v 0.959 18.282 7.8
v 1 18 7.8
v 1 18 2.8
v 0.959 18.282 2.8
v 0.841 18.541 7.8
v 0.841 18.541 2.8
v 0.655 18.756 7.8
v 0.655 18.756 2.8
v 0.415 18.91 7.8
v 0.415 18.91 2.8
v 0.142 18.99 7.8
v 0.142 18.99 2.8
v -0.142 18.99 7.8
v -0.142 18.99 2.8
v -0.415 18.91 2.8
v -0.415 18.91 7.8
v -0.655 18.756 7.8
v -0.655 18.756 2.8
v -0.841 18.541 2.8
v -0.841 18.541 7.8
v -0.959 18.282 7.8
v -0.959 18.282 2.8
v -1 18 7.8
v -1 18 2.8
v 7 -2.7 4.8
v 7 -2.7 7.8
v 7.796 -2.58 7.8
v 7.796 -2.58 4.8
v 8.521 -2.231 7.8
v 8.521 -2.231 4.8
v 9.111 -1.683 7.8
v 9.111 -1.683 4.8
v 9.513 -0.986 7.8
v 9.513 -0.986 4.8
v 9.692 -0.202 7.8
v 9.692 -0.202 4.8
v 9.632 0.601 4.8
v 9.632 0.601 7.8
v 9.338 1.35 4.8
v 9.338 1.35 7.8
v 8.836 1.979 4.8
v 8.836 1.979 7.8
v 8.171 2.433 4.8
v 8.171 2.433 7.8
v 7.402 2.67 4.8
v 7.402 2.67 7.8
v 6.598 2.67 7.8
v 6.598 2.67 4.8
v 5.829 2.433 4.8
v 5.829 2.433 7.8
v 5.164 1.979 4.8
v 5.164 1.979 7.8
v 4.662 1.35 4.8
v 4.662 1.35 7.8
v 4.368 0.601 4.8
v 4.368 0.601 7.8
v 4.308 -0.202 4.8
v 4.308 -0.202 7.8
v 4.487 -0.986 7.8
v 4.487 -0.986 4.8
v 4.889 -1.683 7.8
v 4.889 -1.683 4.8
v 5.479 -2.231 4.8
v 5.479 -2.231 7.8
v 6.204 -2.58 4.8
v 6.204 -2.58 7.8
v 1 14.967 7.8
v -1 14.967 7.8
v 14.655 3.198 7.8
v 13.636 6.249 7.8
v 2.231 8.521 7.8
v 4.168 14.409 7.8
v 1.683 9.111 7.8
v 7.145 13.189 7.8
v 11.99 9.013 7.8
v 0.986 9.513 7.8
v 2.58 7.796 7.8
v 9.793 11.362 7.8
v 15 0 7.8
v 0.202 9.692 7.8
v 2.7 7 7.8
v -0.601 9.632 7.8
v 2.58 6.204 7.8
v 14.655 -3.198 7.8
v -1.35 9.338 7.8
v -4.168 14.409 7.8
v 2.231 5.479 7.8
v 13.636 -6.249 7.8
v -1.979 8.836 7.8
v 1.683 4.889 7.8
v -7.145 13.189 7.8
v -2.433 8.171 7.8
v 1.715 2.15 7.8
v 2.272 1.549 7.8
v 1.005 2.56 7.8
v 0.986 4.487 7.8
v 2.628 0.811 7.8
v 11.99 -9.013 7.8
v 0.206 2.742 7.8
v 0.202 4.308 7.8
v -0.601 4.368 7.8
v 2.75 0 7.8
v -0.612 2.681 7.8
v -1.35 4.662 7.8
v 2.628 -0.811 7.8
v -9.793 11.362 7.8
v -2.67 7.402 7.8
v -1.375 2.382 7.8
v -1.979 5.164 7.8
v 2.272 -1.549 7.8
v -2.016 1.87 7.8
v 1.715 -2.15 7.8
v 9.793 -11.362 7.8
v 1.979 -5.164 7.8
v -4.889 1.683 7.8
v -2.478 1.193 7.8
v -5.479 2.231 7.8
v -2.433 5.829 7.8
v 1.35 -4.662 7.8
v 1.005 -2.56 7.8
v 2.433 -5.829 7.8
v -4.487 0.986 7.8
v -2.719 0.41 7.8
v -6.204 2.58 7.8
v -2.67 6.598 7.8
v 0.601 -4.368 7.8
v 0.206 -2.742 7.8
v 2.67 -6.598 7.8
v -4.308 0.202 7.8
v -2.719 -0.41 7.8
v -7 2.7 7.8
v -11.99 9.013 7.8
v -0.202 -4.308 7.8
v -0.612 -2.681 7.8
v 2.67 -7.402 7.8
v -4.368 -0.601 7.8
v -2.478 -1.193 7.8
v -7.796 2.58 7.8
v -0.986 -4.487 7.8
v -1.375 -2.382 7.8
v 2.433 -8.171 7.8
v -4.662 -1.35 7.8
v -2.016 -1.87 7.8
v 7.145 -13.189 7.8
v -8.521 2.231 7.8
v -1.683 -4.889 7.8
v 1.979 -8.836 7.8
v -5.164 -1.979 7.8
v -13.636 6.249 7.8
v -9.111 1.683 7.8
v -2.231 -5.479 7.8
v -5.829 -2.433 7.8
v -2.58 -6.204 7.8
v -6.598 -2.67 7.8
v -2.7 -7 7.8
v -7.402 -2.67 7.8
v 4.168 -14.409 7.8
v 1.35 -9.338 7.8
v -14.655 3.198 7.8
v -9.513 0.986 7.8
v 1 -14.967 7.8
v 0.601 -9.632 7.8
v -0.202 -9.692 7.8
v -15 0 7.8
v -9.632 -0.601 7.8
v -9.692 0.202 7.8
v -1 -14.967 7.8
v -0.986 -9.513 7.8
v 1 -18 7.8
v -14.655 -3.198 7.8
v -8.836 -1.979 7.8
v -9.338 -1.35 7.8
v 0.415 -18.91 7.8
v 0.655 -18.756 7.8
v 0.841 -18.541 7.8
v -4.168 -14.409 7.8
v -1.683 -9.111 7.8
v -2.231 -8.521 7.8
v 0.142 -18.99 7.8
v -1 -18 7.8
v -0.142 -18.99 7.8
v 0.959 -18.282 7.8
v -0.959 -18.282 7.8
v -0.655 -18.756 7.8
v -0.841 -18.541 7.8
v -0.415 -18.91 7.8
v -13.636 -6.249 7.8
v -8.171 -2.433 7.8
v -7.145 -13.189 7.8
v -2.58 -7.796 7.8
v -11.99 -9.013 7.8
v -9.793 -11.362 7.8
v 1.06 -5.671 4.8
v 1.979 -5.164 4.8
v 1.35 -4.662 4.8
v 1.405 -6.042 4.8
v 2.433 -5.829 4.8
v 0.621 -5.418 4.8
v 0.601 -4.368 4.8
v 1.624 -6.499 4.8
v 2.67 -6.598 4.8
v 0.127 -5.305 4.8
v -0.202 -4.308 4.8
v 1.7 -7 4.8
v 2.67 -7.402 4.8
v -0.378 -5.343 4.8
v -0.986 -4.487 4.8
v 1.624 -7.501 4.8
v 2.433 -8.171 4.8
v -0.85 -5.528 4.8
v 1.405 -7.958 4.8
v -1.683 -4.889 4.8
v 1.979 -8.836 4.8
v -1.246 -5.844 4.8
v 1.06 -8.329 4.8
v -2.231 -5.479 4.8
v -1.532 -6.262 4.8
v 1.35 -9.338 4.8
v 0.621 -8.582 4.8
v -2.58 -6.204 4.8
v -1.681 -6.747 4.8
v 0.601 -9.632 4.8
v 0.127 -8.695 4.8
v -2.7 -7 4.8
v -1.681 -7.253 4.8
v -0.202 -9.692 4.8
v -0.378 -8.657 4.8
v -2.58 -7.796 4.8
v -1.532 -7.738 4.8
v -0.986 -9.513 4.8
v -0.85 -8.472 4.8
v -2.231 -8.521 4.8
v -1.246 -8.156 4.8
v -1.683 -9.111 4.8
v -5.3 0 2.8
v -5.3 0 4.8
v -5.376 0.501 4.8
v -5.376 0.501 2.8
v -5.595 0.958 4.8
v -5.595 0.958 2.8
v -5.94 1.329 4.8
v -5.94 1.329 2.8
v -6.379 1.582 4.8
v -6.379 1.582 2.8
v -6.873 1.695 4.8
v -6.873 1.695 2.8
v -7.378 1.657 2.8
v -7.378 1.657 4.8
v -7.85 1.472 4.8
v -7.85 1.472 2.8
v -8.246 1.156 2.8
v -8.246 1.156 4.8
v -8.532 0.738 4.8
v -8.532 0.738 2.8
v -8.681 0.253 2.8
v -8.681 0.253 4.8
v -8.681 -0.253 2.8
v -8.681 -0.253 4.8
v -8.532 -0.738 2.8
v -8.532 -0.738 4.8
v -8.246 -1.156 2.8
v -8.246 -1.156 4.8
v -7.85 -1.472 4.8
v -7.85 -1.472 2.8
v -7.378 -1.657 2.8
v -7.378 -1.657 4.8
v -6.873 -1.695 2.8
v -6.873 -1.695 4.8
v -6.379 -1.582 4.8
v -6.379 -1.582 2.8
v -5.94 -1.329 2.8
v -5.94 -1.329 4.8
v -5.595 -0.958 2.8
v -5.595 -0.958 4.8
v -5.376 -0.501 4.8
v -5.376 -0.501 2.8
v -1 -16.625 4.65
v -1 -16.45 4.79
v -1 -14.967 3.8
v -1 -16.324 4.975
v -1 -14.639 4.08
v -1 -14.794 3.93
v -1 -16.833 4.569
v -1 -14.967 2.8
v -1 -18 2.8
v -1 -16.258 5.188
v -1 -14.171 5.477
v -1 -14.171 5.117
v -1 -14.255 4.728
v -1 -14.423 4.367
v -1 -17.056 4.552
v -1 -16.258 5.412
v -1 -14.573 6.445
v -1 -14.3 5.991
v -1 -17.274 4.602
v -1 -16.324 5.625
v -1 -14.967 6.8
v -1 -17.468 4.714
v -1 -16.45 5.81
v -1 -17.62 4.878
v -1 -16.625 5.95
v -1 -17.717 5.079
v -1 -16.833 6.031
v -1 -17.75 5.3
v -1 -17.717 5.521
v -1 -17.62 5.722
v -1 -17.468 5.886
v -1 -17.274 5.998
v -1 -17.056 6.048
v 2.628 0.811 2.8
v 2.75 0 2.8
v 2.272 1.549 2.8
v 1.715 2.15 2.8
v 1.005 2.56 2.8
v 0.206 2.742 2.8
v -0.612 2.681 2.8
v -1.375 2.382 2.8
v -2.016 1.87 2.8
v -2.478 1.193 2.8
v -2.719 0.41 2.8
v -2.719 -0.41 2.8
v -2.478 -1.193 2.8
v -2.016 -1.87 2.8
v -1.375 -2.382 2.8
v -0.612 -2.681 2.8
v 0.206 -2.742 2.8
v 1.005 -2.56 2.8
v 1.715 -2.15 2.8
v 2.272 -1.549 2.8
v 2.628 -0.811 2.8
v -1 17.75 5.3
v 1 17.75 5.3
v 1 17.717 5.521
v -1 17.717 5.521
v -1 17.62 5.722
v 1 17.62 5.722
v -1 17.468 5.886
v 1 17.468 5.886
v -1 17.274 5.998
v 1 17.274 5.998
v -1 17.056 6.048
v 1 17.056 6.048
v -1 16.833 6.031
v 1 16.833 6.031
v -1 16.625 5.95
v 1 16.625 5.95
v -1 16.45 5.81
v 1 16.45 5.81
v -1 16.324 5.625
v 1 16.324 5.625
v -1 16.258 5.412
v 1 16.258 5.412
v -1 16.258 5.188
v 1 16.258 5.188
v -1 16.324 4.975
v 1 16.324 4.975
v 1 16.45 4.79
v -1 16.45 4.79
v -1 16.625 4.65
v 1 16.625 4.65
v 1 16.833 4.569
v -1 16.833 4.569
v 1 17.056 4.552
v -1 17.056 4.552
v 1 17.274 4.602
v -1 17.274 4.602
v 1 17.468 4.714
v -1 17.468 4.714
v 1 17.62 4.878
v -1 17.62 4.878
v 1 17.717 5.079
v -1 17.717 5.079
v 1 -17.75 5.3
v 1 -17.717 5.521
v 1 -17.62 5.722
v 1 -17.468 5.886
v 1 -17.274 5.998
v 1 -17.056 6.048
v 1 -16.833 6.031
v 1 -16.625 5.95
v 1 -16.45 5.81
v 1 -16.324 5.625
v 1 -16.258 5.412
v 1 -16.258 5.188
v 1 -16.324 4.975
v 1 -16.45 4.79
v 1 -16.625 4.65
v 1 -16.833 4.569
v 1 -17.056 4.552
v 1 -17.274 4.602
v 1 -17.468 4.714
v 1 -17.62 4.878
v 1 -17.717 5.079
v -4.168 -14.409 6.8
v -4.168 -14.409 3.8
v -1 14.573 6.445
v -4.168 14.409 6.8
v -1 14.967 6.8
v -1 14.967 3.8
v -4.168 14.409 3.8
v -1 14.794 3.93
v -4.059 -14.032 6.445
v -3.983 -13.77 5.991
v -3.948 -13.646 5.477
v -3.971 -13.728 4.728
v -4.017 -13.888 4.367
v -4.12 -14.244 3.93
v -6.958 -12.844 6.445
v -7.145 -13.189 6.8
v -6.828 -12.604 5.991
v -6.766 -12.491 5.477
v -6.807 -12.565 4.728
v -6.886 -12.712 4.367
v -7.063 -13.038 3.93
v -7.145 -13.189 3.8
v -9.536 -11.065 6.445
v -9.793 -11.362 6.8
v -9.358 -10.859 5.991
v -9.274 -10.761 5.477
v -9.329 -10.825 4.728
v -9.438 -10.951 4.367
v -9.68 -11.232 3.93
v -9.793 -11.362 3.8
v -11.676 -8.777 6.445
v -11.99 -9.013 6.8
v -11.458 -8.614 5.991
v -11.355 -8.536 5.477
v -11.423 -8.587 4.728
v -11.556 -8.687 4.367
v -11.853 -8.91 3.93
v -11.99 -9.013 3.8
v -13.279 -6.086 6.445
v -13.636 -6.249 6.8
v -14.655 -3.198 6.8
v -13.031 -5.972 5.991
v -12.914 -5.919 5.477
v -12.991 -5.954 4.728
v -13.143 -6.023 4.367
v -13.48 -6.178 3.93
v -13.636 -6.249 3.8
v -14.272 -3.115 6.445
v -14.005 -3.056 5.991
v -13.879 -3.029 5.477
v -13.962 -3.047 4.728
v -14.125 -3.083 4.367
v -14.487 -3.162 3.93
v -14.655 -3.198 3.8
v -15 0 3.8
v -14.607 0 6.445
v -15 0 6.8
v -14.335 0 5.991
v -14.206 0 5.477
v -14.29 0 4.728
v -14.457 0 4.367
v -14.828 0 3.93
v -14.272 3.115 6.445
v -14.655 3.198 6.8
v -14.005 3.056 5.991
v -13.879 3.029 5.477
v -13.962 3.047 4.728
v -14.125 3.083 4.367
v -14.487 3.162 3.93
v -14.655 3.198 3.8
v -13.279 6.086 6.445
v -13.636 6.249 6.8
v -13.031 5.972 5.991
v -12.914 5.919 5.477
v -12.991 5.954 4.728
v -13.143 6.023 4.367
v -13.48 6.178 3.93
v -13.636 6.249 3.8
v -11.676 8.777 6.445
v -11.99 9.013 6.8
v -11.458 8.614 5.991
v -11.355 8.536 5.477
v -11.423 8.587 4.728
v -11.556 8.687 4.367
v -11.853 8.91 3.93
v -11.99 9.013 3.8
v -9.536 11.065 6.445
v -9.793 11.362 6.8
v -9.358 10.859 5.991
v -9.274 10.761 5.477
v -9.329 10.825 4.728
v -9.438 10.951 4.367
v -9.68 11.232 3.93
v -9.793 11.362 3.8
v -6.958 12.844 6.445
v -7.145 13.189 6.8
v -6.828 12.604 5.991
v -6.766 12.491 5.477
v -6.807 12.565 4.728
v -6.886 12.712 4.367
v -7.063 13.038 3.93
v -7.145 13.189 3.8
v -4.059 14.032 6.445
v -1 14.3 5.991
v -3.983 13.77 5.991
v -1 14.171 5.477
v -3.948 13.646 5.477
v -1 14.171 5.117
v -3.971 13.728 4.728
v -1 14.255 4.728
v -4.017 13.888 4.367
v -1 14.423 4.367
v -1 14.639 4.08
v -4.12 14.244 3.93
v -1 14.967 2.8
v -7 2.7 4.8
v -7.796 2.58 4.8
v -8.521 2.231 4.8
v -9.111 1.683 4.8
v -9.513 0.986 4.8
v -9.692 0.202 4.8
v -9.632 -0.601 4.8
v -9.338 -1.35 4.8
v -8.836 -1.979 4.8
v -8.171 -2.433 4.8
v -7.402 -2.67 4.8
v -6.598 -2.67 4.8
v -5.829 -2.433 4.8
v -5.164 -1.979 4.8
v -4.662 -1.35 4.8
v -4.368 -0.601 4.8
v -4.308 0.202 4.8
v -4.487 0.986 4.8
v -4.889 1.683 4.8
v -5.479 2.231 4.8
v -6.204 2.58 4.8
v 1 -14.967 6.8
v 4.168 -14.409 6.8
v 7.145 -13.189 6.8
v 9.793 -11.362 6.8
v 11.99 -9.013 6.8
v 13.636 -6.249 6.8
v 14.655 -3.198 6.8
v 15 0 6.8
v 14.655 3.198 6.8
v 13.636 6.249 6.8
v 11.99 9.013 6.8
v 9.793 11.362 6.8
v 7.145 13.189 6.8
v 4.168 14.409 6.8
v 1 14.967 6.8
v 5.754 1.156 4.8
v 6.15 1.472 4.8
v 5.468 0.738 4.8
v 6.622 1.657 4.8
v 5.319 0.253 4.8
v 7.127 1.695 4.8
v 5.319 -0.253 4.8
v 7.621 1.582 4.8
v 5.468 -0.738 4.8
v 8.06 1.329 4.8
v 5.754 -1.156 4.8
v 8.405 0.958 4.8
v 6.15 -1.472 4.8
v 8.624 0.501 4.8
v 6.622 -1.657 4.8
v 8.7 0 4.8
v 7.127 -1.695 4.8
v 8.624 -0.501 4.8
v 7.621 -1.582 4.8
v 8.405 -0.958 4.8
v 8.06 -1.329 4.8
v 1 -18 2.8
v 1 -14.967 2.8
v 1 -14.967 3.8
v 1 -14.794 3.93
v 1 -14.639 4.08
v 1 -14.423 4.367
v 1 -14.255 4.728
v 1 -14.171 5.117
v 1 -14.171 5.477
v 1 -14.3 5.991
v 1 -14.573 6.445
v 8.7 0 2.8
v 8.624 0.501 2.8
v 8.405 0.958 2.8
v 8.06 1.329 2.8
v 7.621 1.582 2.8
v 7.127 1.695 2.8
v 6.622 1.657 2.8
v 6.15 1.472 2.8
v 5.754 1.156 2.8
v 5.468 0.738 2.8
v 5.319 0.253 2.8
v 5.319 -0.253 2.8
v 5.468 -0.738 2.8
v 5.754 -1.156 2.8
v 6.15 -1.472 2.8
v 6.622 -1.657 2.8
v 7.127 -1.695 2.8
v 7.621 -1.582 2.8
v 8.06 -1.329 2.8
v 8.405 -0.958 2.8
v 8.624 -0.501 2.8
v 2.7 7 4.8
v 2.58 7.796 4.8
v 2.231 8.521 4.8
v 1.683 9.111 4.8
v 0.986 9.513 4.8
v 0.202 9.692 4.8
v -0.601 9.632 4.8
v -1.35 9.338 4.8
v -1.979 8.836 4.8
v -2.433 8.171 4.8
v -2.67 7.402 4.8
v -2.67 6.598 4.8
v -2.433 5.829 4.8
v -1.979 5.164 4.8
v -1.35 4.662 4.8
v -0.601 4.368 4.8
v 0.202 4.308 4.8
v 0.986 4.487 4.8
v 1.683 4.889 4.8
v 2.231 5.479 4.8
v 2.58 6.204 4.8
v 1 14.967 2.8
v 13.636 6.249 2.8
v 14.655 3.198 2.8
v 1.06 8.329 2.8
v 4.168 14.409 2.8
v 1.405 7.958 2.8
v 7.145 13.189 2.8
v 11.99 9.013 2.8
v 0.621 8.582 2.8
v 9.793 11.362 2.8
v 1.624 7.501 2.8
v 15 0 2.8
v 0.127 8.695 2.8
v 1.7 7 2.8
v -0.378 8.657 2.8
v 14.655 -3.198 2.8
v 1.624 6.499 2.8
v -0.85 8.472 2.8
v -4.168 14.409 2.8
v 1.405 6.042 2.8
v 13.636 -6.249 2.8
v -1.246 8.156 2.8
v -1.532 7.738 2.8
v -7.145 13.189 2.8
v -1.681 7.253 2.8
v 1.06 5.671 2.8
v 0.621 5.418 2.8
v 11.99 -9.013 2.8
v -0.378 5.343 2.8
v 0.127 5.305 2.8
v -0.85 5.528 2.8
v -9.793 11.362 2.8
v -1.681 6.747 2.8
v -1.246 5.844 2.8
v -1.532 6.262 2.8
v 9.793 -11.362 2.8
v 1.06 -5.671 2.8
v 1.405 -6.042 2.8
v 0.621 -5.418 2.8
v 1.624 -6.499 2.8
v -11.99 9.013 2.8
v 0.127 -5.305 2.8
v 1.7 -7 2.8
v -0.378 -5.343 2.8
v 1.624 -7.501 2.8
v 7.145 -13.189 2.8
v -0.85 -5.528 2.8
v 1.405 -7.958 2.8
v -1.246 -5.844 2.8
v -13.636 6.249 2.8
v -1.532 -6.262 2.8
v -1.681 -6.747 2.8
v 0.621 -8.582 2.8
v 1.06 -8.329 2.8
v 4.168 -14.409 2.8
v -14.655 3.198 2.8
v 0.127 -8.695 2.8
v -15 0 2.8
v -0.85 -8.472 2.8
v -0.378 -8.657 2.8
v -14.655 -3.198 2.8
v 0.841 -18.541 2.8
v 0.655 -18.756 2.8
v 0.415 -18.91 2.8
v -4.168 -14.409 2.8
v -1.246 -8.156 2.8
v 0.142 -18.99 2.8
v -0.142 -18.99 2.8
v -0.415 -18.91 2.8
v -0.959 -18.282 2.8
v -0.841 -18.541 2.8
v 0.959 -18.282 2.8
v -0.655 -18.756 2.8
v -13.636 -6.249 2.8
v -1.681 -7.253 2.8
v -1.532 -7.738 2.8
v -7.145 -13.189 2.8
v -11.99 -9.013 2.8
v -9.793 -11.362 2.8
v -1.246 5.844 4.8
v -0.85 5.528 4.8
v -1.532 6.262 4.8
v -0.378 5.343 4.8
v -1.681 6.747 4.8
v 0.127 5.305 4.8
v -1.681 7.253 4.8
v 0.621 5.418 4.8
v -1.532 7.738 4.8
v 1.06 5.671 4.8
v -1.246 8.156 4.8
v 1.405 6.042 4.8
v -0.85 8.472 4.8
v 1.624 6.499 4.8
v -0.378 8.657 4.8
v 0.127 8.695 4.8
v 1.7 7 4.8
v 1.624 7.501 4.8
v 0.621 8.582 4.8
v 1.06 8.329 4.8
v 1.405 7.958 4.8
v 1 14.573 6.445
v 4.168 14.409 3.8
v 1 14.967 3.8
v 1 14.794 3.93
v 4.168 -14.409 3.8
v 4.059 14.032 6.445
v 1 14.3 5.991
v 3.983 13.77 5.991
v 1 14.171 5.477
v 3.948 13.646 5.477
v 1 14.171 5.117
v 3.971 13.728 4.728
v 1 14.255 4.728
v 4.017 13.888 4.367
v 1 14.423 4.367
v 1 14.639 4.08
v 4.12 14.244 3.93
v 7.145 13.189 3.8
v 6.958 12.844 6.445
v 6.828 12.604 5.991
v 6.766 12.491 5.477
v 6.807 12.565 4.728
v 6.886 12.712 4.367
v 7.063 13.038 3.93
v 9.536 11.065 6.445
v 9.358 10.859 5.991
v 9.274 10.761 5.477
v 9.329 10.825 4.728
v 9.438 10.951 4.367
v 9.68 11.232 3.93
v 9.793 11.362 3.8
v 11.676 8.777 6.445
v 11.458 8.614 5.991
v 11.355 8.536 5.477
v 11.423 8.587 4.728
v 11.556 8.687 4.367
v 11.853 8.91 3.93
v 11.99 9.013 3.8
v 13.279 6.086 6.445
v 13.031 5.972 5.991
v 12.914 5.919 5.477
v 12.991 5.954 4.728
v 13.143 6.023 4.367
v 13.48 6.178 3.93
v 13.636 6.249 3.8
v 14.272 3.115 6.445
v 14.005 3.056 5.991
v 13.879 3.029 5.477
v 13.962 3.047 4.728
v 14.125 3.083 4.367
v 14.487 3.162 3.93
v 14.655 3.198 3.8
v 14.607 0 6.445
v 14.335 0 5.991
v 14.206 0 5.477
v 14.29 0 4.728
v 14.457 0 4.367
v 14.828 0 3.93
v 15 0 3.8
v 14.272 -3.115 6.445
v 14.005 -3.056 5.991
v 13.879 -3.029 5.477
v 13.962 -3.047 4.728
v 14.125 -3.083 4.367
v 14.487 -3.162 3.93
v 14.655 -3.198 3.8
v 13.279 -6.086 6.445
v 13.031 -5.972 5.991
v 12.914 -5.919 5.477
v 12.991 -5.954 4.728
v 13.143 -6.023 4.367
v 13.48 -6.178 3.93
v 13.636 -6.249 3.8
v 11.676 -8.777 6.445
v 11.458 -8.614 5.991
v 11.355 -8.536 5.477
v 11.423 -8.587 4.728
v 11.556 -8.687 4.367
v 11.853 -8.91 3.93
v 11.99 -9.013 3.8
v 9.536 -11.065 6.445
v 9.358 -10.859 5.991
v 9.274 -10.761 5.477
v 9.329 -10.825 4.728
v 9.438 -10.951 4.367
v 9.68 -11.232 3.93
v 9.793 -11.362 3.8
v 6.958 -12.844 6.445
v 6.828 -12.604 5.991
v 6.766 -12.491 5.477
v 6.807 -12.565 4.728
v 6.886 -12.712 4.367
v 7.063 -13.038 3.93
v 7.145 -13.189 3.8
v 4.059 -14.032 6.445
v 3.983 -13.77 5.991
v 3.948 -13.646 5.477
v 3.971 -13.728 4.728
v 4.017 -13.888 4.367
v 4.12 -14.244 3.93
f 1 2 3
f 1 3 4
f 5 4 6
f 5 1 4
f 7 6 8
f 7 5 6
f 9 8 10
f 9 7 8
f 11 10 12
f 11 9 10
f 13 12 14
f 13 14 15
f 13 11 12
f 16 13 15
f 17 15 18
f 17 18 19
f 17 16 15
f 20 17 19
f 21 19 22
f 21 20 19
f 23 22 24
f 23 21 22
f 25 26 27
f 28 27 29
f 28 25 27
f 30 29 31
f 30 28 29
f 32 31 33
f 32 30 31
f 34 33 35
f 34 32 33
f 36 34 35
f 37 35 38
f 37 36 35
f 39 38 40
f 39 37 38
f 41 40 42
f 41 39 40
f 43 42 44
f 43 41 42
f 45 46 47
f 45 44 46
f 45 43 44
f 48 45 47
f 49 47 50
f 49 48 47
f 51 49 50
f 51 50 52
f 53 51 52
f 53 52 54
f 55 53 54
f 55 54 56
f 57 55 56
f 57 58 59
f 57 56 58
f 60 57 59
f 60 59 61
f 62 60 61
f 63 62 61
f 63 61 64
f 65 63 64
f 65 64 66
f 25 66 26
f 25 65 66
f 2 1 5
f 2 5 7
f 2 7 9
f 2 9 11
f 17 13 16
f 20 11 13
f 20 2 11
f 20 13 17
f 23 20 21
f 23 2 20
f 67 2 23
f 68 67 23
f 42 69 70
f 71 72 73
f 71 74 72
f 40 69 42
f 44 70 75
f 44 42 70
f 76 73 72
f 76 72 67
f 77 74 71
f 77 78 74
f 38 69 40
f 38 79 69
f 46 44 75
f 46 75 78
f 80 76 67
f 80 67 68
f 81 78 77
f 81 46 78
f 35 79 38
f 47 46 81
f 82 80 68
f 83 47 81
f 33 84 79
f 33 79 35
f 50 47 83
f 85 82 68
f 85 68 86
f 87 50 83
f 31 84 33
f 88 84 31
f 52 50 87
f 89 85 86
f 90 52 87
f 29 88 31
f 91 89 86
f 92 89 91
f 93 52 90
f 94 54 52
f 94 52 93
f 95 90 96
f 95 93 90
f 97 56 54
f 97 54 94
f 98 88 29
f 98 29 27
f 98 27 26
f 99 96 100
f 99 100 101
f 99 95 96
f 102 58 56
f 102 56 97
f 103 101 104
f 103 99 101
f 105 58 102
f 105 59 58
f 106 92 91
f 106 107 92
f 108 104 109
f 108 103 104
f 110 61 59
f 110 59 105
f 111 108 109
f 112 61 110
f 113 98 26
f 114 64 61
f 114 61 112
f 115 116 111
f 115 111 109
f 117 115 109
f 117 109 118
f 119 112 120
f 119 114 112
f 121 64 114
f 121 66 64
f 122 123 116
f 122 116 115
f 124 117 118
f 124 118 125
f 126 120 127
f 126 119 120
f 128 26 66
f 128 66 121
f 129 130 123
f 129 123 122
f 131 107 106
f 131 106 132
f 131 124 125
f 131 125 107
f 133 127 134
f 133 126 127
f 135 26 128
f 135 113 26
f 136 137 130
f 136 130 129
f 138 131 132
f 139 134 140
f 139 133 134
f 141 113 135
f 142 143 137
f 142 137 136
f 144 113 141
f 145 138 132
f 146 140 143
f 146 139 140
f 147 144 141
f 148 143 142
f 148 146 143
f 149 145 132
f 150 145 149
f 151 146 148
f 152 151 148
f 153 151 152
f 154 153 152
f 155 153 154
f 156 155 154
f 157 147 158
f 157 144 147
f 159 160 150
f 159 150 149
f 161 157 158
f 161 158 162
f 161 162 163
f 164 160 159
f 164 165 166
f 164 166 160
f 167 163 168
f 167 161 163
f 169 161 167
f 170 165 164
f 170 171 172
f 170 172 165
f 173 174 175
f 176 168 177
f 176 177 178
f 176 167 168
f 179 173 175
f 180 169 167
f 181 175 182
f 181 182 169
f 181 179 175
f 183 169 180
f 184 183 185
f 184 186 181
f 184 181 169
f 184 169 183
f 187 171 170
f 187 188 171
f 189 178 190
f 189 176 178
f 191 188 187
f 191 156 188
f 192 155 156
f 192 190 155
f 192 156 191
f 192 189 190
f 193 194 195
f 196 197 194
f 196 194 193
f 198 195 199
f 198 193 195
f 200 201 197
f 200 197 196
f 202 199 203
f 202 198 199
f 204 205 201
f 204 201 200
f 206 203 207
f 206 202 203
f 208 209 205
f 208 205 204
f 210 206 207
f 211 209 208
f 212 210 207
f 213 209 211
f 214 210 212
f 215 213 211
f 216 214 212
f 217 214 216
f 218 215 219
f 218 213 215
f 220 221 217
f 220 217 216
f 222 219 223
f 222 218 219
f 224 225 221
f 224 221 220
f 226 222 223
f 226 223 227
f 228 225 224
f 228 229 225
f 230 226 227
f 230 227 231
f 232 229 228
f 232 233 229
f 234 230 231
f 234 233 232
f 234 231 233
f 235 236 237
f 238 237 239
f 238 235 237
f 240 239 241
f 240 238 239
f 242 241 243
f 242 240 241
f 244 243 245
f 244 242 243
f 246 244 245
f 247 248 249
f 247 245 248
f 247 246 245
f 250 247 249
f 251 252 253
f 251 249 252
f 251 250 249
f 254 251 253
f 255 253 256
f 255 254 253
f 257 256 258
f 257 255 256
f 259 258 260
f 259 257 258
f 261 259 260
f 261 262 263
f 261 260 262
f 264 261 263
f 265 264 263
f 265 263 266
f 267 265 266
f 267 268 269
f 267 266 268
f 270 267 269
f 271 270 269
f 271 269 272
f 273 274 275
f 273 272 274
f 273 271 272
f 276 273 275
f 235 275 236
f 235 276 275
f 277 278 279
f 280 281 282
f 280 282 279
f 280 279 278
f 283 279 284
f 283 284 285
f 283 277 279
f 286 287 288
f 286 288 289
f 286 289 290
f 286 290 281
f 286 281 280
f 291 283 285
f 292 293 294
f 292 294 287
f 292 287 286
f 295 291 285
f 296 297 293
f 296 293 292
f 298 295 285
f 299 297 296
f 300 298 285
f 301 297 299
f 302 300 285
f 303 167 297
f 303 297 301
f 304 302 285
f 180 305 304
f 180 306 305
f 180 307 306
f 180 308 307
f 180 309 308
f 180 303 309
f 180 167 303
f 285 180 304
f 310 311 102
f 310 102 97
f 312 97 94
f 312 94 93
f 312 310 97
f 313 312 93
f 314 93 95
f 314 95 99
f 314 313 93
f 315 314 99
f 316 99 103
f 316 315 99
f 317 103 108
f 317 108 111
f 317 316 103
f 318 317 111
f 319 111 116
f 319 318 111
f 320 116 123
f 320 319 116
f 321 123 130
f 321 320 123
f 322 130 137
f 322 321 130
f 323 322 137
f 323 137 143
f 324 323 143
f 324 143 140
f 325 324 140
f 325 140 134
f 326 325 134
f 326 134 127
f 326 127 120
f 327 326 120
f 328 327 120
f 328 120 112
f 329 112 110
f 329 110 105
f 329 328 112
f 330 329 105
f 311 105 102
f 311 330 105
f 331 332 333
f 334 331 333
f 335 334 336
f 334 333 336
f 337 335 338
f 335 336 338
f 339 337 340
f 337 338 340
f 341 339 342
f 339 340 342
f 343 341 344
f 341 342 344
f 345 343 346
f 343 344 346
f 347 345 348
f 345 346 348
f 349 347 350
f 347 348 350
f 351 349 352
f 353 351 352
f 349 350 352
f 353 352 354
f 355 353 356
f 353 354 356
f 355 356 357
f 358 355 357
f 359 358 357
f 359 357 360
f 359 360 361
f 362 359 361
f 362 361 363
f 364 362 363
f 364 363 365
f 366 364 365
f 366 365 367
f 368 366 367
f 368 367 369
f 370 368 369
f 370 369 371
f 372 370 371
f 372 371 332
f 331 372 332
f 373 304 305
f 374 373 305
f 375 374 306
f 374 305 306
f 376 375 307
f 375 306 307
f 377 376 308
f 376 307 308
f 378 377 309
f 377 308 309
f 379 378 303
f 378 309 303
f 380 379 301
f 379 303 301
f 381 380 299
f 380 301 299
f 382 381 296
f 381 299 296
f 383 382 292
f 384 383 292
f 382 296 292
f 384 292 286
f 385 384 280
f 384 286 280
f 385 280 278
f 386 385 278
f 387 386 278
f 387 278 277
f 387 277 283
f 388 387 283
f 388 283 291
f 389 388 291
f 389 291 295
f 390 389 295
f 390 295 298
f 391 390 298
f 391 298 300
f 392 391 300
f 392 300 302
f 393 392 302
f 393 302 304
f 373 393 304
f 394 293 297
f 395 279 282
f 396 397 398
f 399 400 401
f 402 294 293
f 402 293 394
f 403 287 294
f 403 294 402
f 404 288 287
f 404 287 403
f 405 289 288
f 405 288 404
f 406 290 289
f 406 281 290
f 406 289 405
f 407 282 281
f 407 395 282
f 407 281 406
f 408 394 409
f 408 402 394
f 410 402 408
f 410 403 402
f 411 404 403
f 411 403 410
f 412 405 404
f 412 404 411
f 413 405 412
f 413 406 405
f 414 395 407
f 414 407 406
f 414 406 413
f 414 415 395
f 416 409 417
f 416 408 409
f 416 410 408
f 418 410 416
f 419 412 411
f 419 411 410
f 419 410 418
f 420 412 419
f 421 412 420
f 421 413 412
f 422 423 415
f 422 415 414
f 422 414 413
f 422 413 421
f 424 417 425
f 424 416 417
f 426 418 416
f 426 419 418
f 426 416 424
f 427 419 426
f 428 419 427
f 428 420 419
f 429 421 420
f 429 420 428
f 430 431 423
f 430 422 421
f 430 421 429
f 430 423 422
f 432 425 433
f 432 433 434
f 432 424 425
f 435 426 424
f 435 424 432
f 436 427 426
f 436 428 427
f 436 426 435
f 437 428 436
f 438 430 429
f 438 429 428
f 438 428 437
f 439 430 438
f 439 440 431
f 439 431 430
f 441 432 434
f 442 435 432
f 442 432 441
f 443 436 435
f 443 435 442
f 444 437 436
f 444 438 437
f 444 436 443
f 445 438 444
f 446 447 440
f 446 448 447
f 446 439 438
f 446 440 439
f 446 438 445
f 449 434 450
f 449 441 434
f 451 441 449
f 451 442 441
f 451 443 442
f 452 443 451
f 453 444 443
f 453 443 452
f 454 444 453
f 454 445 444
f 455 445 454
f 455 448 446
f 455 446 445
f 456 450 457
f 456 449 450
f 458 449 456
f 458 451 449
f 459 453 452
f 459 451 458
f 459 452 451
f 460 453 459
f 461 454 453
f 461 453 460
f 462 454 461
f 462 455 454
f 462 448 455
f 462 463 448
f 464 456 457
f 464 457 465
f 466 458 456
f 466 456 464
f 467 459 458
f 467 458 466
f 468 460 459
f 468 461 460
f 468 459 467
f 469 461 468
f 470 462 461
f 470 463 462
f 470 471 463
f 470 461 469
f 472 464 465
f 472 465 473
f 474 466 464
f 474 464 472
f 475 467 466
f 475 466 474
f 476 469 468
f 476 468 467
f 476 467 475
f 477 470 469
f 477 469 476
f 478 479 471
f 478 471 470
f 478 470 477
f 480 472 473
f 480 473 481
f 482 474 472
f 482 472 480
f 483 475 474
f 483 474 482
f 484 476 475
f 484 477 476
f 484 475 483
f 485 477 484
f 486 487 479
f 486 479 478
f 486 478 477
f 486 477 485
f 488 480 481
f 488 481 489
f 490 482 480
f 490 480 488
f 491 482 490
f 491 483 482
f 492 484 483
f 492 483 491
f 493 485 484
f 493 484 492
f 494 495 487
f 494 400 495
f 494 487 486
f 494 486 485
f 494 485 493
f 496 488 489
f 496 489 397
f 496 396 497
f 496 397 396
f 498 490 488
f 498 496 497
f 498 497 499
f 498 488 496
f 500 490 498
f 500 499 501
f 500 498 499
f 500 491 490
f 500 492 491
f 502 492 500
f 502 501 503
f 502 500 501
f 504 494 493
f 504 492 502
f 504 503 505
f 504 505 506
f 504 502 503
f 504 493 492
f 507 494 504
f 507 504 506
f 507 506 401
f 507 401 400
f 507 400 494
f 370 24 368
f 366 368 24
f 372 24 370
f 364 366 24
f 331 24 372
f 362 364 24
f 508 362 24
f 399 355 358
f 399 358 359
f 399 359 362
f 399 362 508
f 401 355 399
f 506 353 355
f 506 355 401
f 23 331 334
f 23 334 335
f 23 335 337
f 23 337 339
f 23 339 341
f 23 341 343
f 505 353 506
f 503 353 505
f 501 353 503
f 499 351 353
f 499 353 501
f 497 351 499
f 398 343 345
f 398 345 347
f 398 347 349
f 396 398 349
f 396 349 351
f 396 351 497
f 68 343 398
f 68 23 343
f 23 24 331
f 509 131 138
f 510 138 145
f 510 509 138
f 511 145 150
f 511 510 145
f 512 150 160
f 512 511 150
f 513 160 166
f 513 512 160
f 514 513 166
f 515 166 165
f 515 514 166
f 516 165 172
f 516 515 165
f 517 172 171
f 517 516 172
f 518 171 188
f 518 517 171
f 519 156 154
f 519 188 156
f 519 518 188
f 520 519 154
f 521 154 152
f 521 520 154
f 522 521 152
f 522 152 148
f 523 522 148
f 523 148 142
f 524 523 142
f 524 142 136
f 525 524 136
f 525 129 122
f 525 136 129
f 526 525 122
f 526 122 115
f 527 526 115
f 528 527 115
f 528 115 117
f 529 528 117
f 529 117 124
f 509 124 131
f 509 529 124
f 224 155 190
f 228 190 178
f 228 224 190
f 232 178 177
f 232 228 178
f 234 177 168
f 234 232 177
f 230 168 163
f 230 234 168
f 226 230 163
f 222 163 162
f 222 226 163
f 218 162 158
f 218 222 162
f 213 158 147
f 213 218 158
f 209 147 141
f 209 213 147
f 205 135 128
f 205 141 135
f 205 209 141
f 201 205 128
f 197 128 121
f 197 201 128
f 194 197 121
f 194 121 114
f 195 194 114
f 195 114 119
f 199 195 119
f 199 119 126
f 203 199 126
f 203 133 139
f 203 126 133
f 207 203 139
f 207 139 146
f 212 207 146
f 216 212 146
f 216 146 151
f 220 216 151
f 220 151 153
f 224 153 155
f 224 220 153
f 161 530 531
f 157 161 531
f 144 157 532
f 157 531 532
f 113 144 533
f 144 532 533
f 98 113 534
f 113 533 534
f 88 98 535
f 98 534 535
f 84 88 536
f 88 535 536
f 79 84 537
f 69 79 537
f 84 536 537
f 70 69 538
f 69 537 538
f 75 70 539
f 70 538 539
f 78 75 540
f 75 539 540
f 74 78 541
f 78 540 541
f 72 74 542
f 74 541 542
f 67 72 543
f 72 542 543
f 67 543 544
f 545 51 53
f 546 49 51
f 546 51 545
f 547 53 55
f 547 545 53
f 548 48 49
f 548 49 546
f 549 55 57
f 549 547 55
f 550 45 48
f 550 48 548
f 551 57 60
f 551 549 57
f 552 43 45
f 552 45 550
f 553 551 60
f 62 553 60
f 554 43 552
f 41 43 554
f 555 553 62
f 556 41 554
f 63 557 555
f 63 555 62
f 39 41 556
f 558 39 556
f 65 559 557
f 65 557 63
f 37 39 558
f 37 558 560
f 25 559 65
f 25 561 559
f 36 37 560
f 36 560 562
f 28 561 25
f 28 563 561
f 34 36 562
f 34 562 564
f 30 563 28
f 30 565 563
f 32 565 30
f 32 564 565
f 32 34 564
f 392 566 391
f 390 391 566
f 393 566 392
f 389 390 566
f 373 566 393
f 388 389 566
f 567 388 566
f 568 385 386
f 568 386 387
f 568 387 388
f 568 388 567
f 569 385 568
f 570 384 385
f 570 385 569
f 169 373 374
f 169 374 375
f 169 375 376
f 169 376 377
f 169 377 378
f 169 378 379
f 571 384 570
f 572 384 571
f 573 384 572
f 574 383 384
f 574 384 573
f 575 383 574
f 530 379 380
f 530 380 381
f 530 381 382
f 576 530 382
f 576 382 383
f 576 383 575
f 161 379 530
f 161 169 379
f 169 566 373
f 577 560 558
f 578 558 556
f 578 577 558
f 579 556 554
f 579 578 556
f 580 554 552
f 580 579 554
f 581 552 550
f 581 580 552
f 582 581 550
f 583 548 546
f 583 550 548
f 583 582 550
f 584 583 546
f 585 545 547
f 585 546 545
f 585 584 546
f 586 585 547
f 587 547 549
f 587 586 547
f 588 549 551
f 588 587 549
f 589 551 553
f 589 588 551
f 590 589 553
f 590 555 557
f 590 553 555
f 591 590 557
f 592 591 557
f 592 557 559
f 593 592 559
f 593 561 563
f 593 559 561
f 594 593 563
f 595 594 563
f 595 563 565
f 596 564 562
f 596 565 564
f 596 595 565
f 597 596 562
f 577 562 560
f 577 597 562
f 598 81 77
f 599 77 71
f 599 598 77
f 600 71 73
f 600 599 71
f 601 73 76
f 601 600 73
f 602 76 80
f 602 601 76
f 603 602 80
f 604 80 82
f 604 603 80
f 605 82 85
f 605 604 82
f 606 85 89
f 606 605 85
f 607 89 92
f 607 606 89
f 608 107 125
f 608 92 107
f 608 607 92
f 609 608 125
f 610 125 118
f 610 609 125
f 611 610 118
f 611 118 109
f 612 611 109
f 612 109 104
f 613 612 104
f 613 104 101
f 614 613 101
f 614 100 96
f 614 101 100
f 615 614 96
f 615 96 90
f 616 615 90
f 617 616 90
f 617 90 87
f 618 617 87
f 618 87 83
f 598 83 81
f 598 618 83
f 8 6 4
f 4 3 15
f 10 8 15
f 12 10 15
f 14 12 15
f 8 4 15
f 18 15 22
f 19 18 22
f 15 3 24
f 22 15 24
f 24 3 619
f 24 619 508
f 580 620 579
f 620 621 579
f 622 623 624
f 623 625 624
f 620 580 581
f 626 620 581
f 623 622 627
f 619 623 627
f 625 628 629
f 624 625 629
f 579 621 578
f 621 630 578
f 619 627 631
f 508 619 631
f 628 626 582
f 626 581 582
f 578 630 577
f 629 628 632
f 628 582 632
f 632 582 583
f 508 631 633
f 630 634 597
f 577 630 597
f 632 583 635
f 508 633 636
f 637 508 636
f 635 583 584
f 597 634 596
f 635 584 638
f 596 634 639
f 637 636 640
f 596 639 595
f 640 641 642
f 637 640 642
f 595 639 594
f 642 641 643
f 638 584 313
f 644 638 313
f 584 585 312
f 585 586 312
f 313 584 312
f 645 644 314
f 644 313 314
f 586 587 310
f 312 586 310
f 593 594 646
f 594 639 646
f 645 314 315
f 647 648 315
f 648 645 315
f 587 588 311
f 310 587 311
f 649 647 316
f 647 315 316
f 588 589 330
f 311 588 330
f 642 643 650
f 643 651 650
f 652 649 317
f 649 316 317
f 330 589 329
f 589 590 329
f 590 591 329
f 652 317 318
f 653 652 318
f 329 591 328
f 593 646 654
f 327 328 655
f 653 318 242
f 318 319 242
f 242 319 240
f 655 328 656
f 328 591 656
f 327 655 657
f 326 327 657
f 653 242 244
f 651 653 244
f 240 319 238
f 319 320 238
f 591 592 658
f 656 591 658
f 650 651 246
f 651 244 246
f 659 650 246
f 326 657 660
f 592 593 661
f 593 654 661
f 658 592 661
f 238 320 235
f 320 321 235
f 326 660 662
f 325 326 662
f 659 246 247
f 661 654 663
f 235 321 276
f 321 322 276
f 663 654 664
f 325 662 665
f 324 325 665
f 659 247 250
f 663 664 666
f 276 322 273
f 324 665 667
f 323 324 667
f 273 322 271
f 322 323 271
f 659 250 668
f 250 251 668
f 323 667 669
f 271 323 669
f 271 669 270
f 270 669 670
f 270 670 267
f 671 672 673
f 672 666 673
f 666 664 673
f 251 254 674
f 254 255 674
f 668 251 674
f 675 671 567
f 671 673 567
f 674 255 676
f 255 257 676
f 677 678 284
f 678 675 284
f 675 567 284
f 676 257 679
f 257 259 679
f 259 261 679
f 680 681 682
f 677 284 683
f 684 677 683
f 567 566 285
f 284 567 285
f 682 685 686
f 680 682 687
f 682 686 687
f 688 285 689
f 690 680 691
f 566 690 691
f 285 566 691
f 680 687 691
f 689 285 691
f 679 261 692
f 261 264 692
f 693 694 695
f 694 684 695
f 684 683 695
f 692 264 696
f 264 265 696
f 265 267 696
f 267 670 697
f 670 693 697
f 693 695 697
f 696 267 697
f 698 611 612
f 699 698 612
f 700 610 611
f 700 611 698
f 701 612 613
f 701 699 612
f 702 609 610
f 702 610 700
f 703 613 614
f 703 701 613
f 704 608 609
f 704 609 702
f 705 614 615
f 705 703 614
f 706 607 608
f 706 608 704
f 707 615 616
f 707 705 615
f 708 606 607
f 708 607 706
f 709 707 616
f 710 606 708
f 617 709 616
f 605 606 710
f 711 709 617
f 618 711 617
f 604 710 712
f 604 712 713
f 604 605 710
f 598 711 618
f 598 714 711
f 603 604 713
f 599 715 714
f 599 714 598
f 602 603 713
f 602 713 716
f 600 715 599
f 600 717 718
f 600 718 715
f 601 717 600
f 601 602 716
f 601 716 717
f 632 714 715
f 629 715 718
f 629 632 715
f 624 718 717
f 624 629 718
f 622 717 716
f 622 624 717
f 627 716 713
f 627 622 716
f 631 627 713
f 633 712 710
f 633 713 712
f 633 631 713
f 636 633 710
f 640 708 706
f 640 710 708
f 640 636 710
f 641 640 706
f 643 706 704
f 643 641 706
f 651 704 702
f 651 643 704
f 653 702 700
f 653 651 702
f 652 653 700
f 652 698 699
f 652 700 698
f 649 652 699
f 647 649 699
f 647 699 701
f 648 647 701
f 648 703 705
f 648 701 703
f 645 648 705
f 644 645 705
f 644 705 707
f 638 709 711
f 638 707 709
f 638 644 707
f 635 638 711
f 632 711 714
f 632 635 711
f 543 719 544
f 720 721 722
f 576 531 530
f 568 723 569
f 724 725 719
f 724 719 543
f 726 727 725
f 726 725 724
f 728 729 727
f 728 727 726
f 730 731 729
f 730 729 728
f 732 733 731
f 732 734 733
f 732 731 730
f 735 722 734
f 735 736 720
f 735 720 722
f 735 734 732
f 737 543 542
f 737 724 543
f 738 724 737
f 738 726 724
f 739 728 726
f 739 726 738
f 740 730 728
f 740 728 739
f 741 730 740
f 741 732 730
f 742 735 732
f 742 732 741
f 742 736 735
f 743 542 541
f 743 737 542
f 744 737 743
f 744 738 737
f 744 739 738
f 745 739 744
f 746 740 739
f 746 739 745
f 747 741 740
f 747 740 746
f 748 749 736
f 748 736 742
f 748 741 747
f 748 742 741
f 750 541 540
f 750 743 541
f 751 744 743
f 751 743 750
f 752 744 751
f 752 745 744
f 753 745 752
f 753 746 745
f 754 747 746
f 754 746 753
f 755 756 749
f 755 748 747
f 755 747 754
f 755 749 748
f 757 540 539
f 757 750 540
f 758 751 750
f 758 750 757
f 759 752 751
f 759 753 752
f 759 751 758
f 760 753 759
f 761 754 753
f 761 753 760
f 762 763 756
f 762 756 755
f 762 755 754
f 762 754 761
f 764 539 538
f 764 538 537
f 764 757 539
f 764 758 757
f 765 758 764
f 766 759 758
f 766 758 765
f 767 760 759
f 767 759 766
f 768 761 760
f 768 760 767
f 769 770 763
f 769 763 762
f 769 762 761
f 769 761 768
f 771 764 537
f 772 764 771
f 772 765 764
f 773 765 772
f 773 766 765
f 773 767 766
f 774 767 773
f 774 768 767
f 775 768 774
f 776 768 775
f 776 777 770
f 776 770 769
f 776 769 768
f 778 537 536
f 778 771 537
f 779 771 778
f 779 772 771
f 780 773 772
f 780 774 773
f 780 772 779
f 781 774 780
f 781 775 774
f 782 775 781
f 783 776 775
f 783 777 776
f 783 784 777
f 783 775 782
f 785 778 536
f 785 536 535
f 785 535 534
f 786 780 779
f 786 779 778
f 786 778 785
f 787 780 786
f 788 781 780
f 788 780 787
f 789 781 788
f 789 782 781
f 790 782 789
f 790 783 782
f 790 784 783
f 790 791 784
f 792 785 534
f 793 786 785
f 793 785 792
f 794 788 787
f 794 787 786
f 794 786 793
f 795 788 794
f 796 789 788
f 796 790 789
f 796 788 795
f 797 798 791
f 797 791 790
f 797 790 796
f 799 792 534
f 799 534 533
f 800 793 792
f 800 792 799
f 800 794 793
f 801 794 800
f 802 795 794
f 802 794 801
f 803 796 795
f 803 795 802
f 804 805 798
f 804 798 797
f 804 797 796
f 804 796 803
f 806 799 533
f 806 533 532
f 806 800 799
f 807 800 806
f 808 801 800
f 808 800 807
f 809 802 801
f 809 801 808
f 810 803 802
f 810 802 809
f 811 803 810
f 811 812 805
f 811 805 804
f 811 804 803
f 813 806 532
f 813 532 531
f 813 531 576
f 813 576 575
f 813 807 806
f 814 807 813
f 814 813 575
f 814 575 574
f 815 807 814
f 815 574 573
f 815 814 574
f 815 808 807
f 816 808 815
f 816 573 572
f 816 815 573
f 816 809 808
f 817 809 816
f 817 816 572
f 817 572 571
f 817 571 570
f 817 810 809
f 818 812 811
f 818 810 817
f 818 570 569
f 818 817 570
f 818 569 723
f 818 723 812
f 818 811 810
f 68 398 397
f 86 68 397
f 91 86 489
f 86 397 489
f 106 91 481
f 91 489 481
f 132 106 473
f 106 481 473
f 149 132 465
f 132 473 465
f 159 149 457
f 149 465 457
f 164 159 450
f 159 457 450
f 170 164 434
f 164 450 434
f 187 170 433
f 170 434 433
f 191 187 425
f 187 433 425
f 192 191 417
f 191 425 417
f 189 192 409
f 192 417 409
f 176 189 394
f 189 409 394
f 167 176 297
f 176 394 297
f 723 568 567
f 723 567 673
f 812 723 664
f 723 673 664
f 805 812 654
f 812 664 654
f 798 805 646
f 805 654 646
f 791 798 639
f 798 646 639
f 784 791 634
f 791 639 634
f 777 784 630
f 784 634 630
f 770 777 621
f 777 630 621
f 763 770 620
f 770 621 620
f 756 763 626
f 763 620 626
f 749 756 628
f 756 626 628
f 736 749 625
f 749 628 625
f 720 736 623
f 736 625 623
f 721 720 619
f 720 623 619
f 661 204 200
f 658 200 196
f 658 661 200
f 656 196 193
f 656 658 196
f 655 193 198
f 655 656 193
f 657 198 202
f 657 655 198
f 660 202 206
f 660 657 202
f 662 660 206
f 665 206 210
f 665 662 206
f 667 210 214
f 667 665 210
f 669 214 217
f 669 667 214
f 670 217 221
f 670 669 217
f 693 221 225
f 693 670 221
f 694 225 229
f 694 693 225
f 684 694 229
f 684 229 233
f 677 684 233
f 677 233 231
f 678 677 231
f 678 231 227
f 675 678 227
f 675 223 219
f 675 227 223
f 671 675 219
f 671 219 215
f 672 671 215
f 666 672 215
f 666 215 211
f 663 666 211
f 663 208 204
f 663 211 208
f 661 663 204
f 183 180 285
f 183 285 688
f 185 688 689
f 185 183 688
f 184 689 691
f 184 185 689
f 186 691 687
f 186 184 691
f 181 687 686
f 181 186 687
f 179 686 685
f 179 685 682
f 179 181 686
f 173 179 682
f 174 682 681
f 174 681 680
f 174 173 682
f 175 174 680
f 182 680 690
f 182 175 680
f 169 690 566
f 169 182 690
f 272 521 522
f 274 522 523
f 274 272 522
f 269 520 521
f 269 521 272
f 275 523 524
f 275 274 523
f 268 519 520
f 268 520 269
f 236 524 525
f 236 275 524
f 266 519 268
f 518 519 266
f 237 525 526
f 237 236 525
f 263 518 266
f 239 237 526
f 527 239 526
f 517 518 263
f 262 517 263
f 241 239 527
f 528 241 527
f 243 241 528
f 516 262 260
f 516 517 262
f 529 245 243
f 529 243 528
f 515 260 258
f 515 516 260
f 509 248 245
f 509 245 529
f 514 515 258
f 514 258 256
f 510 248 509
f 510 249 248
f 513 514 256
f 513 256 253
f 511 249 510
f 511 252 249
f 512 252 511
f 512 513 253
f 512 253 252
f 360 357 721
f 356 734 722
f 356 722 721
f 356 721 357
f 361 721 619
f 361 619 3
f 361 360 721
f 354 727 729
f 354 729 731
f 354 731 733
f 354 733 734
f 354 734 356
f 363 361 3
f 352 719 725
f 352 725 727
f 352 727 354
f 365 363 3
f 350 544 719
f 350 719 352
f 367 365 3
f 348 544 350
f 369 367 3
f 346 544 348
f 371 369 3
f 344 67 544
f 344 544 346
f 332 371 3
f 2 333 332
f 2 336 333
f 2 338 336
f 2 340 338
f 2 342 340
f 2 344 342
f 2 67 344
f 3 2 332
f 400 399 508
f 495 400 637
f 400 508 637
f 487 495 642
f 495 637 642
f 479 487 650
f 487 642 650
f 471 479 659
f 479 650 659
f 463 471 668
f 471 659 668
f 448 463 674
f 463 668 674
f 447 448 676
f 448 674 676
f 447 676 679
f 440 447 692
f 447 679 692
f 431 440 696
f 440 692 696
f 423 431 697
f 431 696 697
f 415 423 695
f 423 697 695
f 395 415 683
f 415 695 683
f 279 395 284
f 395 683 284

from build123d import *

# Parameters (mm, degrees)
SKETCH050_R             = 15
SKETCH050_R_2           = 2.75
SKETCH050_R_3           = 1.7
PAD021_DEPTH            = 5
SKETCH051_R             = 2.7
POCKET026_DEPTH         = 88.441037
POLARPATTERN004_COUNT   = 4
PAD022_DEPTH            = 5
SKETCH054_R             = 0.75
POCKET027_DEPTH         = 5
POLARPATTERN005_COUNT   = 2
BODY011_PLACEMENT_ANGLE = 270


with BuildPart() as part:
    # Sketch050 → Pad021 (new body)
    with BuildSketch(Plane.XZ):
        Circle(SKETCH050_R)
        Circle(SKETCH050_R_2, mode=Mode.SUBTRACT)
        with Locations((0, 7)):
            Circle(SKETCH050_R_3, mode=Mode.SUBTRACT)
        with Locations((-7, 0)):
            Circle(SKETCH050_R_3, mode=Mode.SUBTRACT)
        with Locations((0, -7)):
            Circle(SKETCH050_R_3, mode=Mode.SUBTRACT)
        with Locations((7, 0)):
            Circle(SKETCH050_R_3, mode=Mode.SUBTRACT)
    extrude(amount=PAD021_DEPTH)

    # Sketch051 → Pocket026 (cut, through all)
    with BuildSketch(Plane.XZ.offset(2)):
        with Locations((0, 7)):
            Circle(SKETCH051_R)
    pocket026 = extrude(amount=POCKET026_DEPTH, mode=Mode.SUBTRACT)

    # PolarPattern004: Pocket026 ×4 about axis
    polarpattern004_axis = Axis((0, -2, 0), (0, -1, 0))
    for i in range(1, POLARPATTERN004_COUNT):
        add(pocket026.rotate(polarpattern004_axis, i * 360 / POLARPATTERN004_COUNT), mode=Mode.SUBTRACT)

    # Sketch052 → Groove003 (revolve, cut)
    with BuildSketch(Plane.YZ):
        with BuildLine():
            ThreePointArc((-4, 15), (-2.5, 14.197224), (-1, 15))
            Line((-4, 15), (-1, 15))
        make_face()
    revolve(axis=Axis((0, 0, 0), (0, 1, 0)), mode=Mode.SUBTRACT)

    # Sketch053 (on Face10 of Groove003) → Pad022 (join)
    with BuildSketch(Plane.XZ.offset(5)):
        with BuildLine():
            ThreePointArc((1, 18), (0, 19), (-1, 18))
            Line((-1, 18), (-1, 10))
            Line((-1, 10), (1, 10))
            Line((1, 10), (1, 18))
        make_face()
    pad022 = extrude(amount=-PAD022_DEPTH)

    # Sketch054 (on Face6 of Pad022) → Pocket027 (cut)
    with BuildSketch(Plane(origin=(1, 0, 0), x_dir=(0, 0, 1), z_dir=(1, 0, 0))):
        with Locations((17, 2.5)):
            Circle(SKETCH054_R)
    pocket027 = extrude(amount=-POCKET027_DEPTH, mode=Mode.SUBTRACT)

    # PolarPattern005: Pad022, Pocket027 ×2 about axis
    polarpattern005_axis = Axis((0, -5, 0), (0, -1, 0))
    for i in range(1, POLARPATTERN005_COUNT):
        add(pad022.rotate(polarpattern005_axis, i * 360 / POLARPATTERN005_COUNT))
        add(pocket027.rotate(polarpattern005_axis, i * 360 / POLARPATTERN005_COUNT), mode=Mode.SUBTRACT)


with BuildPart() as part_1:
    # Body011 placement: moved
    add(part.part.moved(Location((0, 0, 2.8))).rotate(Axis((0, 0, 2.8), (1, 0, 0)), BODY011_PLACEMENT_ANGLE))


solid = part_1.part
